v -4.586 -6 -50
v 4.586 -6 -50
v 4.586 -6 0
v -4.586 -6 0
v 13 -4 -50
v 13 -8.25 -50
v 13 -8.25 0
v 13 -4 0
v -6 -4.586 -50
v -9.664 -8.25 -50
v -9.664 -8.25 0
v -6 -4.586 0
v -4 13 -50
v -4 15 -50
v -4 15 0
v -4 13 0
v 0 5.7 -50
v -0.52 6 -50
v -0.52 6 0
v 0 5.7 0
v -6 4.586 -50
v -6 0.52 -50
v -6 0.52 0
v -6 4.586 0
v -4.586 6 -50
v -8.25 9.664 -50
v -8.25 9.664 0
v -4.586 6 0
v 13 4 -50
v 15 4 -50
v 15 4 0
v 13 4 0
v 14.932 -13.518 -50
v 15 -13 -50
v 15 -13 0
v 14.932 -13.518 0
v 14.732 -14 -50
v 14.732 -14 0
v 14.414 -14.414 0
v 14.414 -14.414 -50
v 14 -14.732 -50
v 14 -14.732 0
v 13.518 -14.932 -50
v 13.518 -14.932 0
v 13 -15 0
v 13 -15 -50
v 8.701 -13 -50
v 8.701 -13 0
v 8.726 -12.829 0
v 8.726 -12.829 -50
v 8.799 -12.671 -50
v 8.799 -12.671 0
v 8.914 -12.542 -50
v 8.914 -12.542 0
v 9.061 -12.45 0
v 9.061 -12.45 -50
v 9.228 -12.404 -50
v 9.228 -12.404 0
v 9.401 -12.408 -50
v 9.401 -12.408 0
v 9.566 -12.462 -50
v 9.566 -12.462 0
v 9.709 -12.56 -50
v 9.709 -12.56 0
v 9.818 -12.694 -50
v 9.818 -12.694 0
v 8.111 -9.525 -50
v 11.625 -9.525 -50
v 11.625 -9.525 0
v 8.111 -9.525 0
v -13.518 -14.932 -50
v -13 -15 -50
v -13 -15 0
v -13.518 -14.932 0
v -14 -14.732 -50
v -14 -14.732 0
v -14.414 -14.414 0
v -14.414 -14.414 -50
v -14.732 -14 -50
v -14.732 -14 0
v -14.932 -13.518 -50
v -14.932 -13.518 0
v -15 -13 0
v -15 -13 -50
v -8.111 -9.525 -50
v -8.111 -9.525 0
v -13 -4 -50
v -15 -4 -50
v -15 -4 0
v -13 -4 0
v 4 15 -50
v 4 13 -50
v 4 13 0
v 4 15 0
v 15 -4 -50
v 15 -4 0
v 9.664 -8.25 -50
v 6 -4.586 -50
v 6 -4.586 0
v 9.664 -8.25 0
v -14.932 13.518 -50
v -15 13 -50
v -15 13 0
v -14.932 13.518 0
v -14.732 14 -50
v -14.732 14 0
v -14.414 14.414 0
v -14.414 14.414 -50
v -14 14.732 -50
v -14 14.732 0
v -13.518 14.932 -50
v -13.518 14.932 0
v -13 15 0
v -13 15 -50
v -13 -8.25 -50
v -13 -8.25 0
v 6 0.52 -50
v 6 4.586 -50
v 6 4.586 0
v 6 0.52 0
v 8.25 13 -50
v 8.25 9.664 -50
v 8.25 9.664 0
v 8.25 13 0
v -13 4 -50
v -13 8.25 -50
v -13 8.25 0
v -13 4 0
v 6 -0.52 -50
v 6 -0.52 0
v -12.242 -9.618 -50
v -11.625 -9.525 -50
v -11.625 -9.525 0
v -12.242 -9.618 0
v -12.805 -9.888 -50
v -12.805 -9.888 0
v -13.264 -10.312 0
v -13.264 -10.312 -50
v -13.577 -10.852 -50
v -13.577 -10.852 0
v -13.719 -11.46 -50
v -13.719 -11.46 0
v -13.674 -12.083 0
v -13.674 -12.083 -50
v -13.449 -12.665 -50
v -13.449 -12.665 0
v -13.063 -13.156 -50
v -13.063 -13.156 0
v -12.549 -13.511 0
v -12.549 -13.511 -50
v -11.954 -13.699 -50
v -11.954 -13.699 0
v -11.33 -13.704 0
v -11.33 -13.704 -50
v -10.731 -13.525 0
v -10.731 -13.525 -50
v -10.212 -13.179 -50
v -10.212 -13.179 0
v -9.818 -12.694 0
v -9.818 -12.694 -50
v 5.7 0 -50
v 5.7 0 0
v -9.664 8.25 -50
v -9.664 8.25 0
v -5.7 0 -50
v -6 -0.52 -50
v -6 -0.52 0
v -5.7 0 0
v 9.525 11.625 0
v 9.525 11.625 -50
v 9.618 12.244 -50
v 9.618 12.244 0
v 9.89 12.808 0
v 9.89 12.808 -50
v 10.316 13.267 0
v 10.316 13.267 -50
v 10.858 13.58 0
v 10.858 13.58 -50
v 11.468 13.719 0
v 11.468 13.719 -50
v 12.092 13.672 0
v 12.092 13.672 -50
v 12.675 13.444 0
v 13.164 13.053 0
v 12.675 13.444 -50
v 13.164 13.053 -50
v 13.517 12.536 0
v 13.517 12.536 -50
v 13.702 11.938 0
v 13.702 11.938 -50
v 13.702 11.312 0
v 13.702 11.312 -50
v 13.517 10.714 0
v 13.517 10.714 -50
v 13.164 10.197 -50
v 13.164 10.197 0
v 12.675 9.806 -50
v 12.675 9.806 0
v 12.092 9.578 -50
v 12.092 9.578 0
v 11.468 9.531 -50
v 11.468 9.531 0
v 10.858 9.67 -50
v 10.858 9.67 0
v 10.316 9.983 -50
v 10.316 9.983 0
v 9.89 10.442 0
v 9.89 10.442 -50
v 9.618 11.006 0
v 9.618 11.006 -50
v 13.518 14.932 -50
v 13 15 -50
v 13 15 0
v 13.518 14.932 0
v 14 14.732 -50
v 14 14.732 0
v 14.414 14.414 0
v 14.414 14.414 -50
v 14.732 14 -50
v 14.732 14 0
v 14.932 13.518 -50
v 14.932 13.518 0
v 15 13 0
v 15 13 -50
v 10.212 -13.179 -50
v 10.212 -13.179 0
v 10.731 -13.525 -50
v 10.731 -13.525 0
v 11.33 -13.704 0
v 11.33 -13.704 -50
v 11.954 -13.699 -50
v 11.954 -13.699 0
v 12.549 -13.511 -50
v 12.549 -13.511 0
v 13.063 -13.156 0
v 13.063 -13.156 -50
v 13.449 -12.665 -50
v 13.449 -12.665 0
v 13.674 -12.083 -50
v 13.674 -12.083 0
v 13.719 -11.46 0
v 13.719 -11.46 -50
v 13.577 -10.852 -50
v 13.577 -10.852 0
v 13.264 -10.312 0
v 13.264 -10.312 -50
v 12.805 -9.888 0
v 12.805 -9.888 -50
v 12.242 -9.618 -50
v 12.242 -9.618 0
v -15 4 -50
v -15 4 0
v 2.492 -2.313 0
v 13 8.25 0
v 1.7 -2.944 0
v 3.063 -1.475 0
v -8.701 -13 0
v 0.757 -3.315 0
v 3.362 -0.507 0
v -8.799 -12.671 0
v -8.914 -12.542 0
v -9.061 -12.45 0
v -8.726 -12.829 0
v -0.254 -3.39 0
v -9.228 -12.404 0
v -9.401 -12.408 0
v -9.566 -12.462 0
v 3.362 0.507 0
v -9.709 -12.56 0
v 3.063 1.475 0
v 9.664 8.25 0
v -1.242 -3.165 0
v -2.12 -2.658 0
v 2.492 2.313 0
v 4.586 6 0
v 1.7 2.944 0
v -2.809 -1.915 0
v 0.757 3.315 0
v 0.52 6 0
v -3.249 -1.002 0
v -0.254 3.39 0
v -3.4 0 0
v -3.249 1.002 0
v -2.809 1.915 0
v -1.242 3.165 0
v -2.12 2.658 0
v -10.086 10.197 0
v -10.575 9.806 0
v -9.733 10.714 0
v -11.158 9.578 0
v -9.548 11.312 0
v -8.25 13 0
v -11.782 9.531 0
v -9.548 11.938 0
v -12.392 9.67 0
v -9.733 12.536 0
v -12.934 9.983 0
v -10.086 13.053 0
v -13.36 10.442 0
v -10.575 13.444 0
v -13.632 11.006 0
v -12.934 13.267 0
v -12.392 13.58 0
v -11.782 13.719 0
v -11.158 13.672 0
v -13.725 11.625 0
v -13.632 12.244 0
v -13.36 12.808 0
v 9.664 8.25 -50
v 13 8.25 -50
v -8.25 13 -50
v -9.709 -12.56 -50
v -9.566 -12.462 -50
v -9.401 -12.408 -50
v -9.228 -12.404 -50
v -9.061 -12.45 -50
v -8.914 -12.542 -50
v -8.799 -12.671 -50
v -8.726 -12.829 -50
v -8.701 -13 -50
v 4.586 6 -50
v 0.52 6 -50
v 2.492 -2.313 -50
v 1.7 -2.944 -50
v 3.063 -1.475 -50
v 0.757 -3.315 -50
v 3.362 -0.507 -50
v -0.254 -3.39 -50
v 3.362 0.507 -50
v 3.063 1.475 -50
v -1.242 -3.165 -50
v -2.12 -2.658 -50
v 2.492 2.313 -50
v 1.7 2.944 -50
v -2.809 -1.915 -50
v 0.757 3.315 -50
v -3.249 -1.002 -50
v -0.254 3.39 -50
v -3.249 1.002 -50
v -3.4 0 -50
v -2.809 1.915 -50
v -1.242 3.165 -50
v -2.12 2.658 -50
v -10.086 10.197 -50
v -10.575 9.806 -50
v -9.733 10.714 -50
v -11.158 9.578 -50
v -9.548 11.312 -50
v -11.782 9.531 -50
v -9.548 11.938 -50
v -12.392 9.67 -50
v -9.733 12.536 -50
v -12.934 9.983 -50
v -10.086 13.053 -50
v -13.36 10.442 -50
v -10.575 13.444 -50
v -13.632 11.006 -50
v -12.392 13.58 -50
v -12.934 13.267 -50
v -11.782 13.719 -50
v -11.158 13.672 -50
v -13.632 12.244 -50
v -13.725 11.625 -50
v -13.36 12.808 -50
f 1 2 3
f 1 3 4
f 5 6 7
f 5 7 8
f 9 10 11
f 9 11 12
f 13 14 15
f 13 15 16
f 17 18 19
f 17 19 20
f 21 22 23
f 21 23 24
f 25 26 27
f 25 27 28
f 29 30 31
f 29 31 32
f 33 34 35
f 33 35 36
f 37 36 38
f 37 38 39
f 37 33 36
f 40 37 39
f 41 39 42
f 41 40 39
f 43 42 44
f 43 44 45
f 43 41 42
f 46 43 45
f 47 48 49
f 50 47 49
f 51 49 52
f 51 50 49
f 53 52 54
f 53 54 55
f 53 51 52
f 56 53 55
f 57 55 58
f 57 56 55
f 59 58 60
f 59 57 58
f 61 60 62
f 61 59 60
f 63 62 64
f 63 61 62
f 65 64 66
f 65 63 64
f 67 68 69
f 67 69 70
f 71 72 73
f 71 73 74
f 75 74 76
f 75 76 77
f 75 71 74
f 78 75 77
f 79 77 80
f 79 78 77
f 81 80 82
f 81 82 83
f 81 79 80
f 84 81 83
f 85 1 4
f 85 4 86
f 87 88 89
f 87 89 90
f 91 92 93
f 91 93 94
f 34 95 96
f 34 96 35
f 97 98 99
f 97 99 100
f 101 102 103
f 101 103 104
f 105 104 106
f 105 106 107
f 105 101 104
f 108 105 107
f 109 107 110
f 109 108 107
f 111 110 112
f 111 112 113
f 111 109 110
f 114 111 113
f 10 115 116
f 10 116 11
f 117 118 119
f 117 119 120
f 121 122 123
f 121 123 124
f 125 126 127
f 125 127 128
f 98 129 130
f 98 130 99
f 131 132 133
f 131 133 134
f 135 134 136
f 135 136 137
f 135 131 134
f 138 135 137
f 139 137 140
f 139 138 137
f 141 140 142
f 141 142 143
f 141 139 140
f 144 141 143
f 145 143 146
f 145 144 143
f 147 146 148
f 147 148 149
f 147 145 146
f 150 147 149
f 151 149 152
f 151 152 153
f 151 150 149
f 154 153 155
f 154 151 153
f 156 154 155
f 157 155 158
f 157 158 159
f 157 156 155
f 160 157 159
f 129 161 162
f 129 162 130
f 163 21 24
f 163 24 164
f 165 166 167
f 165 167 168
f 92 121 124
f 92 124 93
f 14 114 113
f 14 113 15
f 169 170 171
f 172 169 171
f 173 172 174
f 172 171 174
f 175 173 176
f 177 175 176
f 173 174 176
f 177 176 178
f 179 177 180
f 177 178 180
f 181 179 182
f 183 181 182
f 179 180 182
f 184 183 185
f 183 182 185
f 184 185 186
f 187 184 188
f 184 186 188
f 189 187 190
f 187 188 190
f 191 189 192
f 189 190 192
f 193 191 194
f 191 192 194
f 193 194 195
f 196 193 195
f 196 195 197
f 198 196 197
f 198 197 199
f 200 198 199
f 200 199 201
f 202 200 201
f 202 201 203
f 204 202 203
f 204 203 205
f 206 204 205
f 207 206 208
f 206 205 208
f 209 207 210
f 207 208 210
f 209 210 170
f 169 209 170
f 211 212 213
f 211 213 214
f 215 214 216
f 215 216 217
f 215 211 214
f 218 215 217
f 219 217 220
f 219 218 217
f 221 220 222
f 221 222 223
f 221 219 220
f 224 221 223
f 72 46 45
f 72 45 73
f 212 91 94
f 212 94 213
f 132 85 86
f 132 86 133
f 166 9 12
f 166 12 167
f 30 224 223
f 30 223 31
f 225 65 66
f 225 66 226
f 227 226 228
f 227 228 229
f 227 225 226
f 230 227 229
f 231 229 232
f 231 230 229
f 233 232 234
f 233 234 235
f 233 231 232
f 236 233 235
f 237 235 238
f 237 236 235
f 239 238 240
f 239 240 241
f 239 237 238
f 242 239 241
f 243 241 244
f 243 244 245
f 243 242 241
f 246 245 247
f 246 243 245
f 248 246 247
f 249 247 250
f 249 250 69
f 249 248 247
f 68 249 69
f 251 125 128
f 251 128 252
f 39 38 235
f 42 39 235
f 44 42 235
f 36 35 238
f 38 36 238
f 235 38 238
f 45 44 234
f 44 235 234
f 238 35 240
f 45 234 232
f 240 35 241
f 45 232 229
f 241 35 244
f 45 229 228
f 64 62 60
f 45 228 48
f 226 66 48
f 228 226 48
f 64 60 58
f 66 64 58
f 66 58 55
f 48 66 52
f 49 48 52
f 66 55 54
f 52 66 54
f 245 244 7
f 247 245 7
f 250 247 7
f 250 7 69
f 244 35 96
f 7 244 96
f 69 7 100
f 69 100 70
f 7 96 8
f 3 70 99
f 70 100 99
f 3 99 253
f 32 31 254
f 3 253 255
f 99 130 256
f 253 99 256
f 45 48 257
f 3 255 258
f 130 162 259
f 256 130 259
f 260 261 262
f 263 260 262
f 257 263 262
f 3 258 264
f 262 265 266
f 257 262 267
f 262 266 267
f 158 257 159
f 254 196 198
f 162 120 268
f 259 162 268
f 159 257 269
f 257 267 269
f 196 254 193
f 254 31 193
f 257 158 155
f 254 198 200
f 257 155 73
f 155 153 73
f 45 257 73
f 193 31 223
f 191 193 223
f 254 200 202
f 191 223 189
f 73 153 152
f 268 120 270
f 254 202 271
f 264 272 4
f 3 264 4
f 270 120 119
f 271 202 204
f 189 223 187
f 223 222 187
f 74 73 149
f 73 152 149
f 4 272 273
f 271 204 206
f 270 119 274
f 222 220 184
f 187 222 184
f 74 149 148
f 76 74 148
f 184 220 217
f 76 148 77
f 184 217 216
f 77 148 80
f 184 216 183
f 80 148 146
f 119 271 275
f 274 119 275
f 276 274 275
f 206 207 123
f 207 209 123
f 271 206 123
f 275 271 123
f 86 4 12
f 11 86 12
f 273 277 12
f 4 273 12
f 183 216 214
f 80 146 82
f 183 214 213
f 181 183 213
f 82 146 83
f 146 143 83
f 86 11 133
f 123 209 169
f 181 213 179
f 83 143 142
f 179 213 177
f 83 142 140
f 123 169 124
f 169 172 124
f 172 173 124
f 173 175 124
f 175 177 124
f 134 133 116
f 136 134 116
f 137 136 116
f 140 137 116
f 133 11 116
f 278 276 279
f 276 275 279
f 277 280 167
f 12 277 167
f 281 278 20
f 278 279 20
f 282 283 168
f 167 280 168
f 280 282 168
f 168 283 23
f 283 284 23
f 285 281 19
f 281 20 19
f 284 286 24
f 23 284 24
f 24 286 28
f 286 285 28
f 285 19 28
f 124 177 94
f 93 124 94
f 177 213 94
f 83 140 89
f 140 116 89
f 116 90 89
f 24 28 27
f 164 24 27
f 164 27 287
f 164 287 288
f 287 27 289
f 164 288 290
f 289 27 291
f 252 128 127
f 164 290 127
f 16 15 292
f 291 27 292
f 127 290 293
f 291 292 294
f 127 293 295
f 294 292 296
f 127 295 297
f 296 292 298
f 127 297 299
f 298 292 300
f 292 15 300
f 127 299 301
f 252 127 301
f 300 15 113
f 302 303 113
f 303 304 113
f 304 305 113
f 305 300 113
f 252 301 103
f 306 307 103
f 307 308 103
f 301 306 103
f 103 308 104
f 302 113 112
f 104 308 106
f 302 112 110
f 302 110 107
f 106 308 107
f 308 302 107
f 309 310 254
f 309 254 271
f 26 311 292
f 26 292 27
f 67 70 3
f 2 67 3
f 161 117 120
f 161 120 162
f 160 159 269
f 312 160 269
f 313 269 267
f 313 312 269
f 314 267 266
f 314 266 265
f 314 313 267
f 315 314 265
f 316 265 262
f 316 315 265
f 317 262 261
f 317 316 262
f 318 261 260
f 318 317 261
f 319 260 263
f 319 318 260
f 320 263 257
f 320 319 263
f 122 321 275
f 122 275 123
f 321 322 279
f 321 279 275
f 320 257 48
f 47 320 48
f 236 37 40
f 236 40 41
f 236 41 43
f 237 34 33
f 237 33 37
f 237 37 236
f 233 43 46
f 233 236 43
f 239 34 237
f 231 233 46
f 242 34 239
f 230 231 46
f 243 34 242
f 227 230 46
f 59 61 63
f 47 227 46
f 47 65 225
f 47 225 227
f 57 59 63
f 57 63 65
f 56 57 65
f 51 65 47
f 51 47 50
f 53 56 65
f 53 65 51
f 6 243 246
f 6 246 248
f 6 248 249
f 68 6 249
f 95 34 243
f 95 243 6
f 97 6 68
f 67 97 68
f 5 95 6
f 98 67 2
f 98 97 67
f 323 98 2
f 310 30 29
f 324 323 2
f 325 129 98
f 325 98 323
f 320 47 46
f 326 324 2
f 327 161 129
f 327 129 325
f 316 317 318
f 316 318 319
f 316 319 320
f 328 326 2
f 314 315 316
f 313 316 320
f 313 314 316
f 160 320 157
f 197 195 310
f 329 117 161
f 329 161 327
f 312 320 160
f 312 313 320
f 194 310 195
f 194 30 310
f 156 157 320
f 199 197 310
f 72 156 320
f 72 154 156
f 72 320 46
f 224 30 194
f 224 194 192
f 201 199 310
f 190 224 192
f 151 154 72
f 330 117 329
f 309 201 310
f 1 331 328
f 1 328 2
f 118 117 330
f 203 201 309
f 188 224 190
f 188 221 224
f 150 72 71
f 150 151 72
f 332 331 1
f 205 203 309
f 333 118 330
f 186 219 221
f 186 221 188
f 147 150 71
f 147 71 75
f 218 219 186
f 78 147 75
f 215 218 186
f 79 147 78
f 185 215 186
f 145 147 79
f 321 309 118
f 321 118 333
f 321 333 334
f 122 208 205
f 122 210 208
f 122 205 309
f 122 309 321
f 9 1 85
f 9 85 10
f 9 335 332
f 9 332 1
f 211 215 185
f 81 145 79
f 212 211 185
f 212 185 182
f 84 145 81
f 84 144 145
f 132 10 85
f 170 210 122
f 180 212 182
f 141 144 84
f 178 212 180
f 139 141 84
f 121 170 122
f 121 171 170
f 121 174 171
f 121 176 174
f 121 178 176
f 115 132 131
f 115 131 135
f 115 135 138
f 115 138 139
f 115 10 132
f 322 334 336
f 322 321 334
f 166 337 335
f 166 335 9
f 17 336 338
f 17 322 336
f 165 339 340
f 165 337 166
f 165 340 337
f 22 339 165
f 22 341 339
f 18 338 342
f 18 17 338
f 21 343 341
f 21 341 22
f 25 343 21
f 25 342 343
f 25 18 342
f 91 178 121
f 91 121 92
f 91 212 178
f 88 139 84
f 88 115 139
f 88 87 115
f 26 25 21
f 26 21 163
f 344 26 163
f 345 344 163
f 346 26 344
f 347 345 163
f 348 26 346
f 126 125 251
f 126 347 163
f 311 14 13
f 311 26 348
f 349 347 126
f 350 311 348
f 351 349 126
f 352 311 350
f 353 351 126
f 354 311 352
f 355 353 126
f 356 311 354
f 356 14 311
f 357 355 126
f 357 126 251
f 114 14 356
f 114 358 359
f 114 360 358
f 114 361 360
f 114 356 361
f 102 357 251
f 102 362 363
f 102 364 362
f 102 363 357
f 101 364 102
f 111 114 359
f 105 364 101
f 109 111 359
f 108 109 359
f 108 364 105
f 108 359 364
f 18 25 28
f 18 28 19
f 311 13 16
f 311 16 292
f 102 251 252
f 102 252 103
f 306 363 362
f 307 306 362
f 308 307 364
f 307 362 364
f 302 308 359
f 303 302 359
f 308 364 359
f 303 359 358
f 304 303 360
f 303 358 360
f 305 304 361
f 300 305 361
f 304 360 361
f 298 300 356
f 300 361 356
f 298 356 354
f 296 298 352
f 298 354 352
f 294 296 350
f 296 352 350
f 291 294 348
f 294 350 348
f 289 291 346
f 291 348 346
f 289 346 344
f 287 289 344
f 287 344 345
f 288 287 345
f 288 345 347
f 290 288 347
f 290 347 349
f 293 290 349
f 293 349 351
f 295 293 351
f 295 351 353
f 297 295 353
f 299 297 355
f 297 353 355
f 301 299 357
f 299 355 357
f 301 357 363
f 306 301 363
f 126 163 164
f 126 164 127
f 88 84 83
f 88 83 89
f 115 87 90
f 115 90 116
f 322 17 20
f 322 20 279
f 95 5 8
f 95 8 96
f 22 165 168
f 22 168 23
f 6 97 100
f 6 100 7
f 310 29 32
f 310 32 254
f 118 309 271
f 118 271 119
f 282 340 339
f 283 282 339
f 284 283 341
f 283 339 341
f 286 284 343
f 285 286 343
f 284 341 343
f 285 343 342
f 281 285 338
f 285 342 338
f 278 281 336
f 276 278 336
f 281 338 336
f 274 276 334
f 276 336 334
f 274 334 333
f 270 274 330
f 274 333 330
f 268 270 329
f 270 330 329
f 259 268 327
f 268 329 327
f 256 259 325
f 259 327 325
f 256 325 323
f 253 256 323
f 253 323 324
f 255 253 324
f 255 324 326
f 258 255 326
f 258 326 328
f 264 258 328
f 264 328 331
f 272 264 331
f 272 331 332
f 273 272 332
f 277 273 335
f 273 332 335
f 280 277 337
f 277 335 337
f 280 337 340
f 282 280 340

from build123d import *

# Parameters (mm, degrees)
SKETCH1_R      = 3.4
SKETCH1_R_2    = 2.1
EXTRUDE1_DEPTH = 50


with BuildPart() as part:
    # Sketch1 → Extrude1 (new body)
    with BuildSketch(Plane(origin=(0, 0, -50), x_dir=(-1, 0, 0), z_dir=(0, 0, -1))):
        with BuildLine():
            Line((13, 4), (15, 4))
            Line((15, 4), (15, 13))
            ThreePointArc((15, 13), (14.414213562, 14.414213562), (13, 15))
            Line((13, 15), (4, 15))
            Line((4, 15), (4, 13))
            Line((4, 13), (8.25, 13))
            Line((8.25, 13), (8.25, 9.664213562))
            Line((8.25, 9.664213562), (4.585786438, 6))
            Line((4.585786438, 6), (0.519615242, 6))
            Line((0.519615242, 6), (0, 5.7))
            Line((0, 5.7), (-0.519615242, 6))
            Line((-0.519615242, 6), (-4.585786438, 6))
            Line((-4.585786438, 6), (-8.25, 9.664213562))
            Line((-8.25, 9.664213562), (-8.25, 13))
            Line((-8.25, 13), (-4, 13))
            Line((-4, 13), (-4, 15))
            Line((-4, 15), (-13, 15))
            ThreePointArc((-13, 15), (-14.414213562, 14.414213562), (-15, 13))
            Line((-15, 13), (-15, 4))
            Line((-15, 4), (-13, 4))
            Line((-13, 4), (-13, 8.25))
            Line((-13, 8.25), (-9.664213562, 8.25))
            Line((-9.664213562, 8.25), (-6, 4.585786438))
            Line((-6, 4.585786438), (-6, 0.519615242))
            Line((-6, 0.519615242), (-5.7, 0))
            Line((-5.7, 0), (-6, -0.519615242))
            Line((-6, -0.519615242), (-6, -4.585786438))
            Line((-6, -4.585786438), (-9.664213562, -8.25))
            Line((-9.664213562, -8.25), (-13, -8.25))
            Line((-13, -8.25), (-13, -4))
            Line((-13, -4), (-15, -4))
            Line((-15, -4), (-15, -13))
            ThreePointArc((-15, -13), (-14.414213562, -14.414213562), (-13, -15))
            Line((-13, -15), (13, -15))
            ThreePointArc((13, -15), (14.414213562, -14.414213562), (15, -13))
            Line((15, -13), (15, -4))
            Line((15, -4), (13, -4))
            Line((13, -4), (13, -8.25))
            Line((13, -8.25), (9.664213562, -8.25))
            Line((9.664213562, -8.25), (6, -4.585786438))
            Line((6, -4.585786438), (6, -0.519615242))
            Line((6, -0.519615242), (5.7, 0))
            Line((5.7, 0), (6, 0.519615242))
            Line((6, 0.519615242), (6, 4.585786438))
            Line((6, 4.585786438), (9.664213562, 8.25))
            Line((9.664213562, 8.25), (13, 8.25))
            Line((13, 8.25), (13, 4))
        make_face()
        Circle(SKETCH1_R, mode=Mode.SUBTRACT)
        with Locations((-11.625, 11.625)):
            Circle(SKETCH1_R_2, mode=Mode.SUBTRACT)
        with Locations((11.625, 11.625)):
            Circle(SKETCH1_R_2, mode=Mode.SUBTRACT)
        with BuildLine():
            Line((8.701344475, -13), (-8.701344475, -13))
            ThreePointArc((-8.701344475, -13), (-9.142947405, -12.42128559), (-9.817712369, -12.694444444))
            ThreePointArc((-9.817712369, -12.694444444), (-13.44925784, -12.665232346), (-11.625, -9.525))
            Line((-11.625, -9.525), (-8.110786438, -9.525))
            Line((-8.110786438, -9.525), (-4.585786438, -6))
            Line((-4.585786438, -6), (4.585786438, -6))
            Line((4.585786438, -6), (8.110786438, -9.525))
            Line((8.110786438, -9.525), (11.625, -9.525))
            ThreePointArc((11.625, -9.525), (13.44925784, -12.665232346), (9.817712369, -12.694444444))
            ThreePointArc((9.817712369, -12.694444444), (9.142947405, -12.42128559), (8.701344475, -13))
        make_face(mode=Mode.SUBTRACT)
    extrude(amount=-EXTRUDE1_DEPTH)


solid = part.part
